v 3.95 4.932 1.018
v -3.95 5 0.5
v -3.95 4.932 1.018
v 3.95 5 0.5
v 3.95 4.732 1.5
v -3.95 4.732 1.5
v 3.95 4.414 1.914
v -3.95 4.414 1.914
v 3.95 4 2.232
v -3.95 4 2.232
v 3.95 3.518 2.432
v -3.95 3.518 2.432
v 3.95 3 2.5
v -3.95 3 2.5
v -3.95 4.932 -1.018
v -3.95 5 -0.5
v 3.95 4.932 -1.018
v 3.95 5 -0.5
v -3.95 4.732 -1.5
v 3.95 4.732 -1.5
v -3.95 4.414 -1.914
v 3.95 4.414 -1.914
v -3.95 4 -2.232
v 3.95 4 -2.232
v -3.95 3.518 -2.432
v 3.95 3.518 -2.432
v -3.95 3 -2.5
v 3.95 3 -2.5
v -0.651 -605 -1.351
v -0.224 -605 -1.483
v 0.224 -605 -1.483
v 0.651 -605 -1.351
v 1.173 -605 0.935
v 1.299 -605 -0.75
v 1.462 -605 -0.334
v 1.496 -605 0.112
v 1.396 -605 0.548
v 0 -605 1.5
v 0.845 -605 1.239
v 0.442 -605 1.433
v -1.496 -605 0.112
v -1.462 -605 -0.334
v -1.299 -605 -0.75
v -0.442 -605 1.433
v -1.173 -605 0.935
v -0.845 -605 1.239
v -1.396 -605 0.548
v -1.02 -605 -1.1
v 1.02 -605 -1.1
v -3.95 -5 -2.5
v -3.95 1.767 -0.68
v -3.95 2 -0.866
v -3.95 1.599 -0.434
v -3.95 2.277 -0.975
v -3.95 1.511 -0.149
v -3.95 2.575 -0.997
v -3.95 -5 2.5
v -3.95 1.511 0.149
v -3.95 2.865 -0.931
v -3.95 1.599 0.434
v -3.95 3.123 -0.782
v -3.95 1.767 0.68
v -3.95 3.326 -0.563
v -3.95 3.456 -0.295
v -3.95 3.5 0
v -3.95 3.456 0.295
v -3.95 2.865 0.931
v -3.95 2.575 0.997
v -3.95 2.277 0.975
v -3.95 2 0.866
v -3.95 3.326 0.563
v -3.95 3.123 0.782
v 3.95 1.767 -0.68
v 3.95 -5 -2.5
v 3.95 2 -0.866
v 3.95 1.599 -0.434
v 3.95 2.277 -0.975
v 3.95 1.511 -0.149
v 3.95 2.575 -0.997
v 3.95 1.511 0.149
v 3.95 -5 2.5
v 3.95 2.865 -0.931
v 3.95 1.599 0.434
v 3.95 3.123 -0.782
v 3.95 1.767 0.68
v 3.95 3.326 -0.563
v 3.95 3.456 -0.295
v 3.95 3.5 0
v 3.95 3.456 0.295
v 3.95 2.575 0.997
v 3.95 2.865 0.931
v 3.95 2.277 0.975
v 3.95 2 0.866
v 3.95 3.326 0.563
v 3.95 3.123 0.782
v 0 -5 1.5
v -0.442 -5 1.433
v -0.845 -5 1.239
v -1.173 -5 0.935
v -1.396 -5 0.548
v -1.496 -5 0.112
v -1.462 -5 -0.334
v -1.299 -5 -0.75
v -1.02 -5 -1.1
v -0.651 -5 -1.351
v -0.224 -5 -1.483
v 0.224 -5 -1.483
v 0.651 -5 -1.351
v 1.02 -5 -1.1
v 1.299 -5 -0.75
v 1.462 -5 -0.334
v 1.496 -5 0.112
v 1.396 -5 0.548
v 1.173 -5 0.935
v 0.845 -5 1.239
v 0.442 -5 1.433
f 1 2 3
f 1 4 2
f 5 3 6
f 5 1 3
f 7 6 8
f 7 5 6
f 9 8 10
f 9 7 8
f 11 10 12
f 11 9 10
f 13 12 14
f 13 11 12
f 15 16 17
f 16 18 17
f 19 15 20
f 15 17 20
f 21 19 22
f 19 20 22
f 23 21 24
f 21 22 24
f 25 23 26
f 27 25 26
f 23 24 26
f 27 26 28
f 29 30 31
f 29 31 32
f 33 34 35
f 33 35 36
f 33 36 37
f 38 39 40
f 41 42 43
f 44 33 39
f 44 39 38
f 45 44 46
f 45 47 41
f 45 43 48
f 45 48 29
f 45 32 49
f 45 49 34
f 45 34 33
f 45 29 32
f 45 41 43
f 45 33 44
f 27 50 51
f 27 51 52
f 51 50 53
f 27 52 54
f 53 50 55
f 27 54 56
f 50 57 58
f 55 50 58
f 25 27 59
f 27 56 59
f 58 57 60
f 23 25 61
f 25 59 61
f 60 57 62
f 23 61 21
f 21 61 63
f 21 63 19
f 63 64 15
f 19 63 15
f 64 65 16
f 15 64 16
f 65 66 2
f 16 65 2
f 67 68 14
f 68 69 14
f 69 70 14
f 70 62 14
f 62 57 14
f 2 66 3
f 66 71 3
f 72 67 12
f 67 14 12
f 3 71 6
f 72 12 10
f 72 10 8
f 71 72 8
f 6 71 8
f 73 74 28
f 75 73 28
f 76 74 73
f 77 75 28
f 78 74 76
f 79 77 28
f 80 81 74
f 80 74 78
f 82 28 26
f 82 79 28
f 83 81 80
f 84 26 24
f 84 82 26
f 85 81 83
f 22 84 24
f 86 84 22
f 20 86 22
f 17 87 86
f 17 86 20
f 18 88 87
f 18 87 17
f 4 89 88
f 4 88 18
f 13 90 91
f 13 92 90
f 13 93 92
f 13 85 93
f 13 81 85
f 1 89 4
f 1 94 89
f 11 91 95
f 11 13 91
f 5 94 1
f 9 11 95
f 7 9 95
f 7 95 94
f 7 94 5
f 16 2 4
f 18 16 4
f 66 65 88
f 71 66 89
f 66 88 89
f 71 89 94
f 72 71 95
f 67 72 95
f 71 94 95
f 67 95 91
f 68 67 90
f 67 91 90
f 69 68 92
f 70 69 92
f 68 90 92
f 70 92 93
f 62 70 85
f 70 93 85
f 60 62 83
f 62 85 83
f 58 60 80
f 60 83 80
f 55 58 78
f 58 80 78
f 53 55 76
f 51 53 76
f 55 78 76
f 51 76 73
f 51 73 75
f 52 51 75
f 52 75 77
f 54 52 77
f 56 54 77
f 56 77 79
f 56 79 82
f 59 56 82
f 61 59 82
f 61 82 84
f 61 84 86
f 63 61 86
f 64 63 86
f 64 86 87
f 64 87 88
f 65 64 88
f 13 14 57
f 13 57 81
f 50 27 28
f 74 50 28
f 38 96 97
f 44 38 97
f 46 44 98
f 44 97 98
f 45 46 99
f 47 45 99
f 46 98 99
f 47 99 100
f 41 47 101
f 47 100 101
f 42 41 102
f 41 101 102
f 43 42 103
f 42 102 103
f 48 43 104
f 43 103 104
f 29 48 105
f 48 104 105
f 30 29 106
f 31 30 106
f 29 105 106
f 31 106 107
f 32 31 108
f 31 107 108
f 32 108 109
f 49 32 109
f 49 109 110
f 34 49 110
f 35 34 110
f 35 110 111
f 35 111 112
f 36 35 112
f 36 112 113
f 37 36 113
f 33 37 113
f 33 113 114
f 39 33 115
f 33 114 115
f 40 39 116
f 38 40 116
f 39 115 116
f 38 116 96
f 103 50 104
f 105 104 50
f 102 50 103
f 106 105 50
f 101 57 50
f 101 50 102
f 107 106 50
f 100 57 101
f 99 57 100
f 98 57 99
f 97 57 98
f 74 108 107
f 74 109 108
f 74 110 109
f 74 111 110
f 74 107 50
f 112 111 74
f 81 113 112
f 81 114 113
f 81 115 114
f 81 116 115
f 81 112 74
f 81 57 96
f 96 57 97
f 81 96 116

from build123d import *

# Parameters (mm, degrees)
SKETCH1_W           = 7.9
SKETCH1_H           = 10
BOSS_EXTRUDE1_DEPTH = 2.5
FILLET2_R           = 2
FILLET3_R           = 2
SKETCH4_R           = 1
CUT_EXTRUDE1_DEPTH  = 10
SKETCH5_R           = 1.5
BOSS_EXTRUDE2_DEPTH = 600


with BuildPart() as part:
    # Sketch1 → Boss-Extrude1 (new, symmetric)
    with BuildSketch(Plane.XY):
        Rectangle(SKETCH1_W, SKETCH1_H)
    extrude(amount=BOSS_EXTRUDE1_DEPTH, both=True)

    # Fillet2
    fillet2_edges = [part.edges().sort_by_distance(p)[0] for p in [
        (0, 5, -2.5),
    ]]
    fillet(fillet2_edges, radius=FILLET2_R)

    # Fillet3
    fillet3_edges = [part.edges().sort_by_distance(p)[0] for p in [
        (0, 5, 2.5),
    ]]
    fillet(fillet3_edges, radius=FILLET3_R)

    # Sketch4 → Cut-Extrude1 (cut)
    with BuildSketch(Plane(origin=(3.95, 0, 0), x_dir=(0, 0, -1), z_dir=(1, 0, 0))):
        with Locations(Location((0, 2.5, 0), (0, 0, 90))):
            Circle(SKETCH4_R)
    extrude(amount=-CUT_EXTRUDE1_DEPTH, mode=Mode.SUBTRACT)

    # Sketch5 → Boss-Extrude2 (add)
    with BuildSketch(Plane.XZ.offset(5)):
        with Locations(Location((0, 0, 0), (0, 0, 90))):
            Circle(SKETCH5_R)
    extrude(amount=BOSS_EXTRUDE2_DEPTH)


solid = part.part
